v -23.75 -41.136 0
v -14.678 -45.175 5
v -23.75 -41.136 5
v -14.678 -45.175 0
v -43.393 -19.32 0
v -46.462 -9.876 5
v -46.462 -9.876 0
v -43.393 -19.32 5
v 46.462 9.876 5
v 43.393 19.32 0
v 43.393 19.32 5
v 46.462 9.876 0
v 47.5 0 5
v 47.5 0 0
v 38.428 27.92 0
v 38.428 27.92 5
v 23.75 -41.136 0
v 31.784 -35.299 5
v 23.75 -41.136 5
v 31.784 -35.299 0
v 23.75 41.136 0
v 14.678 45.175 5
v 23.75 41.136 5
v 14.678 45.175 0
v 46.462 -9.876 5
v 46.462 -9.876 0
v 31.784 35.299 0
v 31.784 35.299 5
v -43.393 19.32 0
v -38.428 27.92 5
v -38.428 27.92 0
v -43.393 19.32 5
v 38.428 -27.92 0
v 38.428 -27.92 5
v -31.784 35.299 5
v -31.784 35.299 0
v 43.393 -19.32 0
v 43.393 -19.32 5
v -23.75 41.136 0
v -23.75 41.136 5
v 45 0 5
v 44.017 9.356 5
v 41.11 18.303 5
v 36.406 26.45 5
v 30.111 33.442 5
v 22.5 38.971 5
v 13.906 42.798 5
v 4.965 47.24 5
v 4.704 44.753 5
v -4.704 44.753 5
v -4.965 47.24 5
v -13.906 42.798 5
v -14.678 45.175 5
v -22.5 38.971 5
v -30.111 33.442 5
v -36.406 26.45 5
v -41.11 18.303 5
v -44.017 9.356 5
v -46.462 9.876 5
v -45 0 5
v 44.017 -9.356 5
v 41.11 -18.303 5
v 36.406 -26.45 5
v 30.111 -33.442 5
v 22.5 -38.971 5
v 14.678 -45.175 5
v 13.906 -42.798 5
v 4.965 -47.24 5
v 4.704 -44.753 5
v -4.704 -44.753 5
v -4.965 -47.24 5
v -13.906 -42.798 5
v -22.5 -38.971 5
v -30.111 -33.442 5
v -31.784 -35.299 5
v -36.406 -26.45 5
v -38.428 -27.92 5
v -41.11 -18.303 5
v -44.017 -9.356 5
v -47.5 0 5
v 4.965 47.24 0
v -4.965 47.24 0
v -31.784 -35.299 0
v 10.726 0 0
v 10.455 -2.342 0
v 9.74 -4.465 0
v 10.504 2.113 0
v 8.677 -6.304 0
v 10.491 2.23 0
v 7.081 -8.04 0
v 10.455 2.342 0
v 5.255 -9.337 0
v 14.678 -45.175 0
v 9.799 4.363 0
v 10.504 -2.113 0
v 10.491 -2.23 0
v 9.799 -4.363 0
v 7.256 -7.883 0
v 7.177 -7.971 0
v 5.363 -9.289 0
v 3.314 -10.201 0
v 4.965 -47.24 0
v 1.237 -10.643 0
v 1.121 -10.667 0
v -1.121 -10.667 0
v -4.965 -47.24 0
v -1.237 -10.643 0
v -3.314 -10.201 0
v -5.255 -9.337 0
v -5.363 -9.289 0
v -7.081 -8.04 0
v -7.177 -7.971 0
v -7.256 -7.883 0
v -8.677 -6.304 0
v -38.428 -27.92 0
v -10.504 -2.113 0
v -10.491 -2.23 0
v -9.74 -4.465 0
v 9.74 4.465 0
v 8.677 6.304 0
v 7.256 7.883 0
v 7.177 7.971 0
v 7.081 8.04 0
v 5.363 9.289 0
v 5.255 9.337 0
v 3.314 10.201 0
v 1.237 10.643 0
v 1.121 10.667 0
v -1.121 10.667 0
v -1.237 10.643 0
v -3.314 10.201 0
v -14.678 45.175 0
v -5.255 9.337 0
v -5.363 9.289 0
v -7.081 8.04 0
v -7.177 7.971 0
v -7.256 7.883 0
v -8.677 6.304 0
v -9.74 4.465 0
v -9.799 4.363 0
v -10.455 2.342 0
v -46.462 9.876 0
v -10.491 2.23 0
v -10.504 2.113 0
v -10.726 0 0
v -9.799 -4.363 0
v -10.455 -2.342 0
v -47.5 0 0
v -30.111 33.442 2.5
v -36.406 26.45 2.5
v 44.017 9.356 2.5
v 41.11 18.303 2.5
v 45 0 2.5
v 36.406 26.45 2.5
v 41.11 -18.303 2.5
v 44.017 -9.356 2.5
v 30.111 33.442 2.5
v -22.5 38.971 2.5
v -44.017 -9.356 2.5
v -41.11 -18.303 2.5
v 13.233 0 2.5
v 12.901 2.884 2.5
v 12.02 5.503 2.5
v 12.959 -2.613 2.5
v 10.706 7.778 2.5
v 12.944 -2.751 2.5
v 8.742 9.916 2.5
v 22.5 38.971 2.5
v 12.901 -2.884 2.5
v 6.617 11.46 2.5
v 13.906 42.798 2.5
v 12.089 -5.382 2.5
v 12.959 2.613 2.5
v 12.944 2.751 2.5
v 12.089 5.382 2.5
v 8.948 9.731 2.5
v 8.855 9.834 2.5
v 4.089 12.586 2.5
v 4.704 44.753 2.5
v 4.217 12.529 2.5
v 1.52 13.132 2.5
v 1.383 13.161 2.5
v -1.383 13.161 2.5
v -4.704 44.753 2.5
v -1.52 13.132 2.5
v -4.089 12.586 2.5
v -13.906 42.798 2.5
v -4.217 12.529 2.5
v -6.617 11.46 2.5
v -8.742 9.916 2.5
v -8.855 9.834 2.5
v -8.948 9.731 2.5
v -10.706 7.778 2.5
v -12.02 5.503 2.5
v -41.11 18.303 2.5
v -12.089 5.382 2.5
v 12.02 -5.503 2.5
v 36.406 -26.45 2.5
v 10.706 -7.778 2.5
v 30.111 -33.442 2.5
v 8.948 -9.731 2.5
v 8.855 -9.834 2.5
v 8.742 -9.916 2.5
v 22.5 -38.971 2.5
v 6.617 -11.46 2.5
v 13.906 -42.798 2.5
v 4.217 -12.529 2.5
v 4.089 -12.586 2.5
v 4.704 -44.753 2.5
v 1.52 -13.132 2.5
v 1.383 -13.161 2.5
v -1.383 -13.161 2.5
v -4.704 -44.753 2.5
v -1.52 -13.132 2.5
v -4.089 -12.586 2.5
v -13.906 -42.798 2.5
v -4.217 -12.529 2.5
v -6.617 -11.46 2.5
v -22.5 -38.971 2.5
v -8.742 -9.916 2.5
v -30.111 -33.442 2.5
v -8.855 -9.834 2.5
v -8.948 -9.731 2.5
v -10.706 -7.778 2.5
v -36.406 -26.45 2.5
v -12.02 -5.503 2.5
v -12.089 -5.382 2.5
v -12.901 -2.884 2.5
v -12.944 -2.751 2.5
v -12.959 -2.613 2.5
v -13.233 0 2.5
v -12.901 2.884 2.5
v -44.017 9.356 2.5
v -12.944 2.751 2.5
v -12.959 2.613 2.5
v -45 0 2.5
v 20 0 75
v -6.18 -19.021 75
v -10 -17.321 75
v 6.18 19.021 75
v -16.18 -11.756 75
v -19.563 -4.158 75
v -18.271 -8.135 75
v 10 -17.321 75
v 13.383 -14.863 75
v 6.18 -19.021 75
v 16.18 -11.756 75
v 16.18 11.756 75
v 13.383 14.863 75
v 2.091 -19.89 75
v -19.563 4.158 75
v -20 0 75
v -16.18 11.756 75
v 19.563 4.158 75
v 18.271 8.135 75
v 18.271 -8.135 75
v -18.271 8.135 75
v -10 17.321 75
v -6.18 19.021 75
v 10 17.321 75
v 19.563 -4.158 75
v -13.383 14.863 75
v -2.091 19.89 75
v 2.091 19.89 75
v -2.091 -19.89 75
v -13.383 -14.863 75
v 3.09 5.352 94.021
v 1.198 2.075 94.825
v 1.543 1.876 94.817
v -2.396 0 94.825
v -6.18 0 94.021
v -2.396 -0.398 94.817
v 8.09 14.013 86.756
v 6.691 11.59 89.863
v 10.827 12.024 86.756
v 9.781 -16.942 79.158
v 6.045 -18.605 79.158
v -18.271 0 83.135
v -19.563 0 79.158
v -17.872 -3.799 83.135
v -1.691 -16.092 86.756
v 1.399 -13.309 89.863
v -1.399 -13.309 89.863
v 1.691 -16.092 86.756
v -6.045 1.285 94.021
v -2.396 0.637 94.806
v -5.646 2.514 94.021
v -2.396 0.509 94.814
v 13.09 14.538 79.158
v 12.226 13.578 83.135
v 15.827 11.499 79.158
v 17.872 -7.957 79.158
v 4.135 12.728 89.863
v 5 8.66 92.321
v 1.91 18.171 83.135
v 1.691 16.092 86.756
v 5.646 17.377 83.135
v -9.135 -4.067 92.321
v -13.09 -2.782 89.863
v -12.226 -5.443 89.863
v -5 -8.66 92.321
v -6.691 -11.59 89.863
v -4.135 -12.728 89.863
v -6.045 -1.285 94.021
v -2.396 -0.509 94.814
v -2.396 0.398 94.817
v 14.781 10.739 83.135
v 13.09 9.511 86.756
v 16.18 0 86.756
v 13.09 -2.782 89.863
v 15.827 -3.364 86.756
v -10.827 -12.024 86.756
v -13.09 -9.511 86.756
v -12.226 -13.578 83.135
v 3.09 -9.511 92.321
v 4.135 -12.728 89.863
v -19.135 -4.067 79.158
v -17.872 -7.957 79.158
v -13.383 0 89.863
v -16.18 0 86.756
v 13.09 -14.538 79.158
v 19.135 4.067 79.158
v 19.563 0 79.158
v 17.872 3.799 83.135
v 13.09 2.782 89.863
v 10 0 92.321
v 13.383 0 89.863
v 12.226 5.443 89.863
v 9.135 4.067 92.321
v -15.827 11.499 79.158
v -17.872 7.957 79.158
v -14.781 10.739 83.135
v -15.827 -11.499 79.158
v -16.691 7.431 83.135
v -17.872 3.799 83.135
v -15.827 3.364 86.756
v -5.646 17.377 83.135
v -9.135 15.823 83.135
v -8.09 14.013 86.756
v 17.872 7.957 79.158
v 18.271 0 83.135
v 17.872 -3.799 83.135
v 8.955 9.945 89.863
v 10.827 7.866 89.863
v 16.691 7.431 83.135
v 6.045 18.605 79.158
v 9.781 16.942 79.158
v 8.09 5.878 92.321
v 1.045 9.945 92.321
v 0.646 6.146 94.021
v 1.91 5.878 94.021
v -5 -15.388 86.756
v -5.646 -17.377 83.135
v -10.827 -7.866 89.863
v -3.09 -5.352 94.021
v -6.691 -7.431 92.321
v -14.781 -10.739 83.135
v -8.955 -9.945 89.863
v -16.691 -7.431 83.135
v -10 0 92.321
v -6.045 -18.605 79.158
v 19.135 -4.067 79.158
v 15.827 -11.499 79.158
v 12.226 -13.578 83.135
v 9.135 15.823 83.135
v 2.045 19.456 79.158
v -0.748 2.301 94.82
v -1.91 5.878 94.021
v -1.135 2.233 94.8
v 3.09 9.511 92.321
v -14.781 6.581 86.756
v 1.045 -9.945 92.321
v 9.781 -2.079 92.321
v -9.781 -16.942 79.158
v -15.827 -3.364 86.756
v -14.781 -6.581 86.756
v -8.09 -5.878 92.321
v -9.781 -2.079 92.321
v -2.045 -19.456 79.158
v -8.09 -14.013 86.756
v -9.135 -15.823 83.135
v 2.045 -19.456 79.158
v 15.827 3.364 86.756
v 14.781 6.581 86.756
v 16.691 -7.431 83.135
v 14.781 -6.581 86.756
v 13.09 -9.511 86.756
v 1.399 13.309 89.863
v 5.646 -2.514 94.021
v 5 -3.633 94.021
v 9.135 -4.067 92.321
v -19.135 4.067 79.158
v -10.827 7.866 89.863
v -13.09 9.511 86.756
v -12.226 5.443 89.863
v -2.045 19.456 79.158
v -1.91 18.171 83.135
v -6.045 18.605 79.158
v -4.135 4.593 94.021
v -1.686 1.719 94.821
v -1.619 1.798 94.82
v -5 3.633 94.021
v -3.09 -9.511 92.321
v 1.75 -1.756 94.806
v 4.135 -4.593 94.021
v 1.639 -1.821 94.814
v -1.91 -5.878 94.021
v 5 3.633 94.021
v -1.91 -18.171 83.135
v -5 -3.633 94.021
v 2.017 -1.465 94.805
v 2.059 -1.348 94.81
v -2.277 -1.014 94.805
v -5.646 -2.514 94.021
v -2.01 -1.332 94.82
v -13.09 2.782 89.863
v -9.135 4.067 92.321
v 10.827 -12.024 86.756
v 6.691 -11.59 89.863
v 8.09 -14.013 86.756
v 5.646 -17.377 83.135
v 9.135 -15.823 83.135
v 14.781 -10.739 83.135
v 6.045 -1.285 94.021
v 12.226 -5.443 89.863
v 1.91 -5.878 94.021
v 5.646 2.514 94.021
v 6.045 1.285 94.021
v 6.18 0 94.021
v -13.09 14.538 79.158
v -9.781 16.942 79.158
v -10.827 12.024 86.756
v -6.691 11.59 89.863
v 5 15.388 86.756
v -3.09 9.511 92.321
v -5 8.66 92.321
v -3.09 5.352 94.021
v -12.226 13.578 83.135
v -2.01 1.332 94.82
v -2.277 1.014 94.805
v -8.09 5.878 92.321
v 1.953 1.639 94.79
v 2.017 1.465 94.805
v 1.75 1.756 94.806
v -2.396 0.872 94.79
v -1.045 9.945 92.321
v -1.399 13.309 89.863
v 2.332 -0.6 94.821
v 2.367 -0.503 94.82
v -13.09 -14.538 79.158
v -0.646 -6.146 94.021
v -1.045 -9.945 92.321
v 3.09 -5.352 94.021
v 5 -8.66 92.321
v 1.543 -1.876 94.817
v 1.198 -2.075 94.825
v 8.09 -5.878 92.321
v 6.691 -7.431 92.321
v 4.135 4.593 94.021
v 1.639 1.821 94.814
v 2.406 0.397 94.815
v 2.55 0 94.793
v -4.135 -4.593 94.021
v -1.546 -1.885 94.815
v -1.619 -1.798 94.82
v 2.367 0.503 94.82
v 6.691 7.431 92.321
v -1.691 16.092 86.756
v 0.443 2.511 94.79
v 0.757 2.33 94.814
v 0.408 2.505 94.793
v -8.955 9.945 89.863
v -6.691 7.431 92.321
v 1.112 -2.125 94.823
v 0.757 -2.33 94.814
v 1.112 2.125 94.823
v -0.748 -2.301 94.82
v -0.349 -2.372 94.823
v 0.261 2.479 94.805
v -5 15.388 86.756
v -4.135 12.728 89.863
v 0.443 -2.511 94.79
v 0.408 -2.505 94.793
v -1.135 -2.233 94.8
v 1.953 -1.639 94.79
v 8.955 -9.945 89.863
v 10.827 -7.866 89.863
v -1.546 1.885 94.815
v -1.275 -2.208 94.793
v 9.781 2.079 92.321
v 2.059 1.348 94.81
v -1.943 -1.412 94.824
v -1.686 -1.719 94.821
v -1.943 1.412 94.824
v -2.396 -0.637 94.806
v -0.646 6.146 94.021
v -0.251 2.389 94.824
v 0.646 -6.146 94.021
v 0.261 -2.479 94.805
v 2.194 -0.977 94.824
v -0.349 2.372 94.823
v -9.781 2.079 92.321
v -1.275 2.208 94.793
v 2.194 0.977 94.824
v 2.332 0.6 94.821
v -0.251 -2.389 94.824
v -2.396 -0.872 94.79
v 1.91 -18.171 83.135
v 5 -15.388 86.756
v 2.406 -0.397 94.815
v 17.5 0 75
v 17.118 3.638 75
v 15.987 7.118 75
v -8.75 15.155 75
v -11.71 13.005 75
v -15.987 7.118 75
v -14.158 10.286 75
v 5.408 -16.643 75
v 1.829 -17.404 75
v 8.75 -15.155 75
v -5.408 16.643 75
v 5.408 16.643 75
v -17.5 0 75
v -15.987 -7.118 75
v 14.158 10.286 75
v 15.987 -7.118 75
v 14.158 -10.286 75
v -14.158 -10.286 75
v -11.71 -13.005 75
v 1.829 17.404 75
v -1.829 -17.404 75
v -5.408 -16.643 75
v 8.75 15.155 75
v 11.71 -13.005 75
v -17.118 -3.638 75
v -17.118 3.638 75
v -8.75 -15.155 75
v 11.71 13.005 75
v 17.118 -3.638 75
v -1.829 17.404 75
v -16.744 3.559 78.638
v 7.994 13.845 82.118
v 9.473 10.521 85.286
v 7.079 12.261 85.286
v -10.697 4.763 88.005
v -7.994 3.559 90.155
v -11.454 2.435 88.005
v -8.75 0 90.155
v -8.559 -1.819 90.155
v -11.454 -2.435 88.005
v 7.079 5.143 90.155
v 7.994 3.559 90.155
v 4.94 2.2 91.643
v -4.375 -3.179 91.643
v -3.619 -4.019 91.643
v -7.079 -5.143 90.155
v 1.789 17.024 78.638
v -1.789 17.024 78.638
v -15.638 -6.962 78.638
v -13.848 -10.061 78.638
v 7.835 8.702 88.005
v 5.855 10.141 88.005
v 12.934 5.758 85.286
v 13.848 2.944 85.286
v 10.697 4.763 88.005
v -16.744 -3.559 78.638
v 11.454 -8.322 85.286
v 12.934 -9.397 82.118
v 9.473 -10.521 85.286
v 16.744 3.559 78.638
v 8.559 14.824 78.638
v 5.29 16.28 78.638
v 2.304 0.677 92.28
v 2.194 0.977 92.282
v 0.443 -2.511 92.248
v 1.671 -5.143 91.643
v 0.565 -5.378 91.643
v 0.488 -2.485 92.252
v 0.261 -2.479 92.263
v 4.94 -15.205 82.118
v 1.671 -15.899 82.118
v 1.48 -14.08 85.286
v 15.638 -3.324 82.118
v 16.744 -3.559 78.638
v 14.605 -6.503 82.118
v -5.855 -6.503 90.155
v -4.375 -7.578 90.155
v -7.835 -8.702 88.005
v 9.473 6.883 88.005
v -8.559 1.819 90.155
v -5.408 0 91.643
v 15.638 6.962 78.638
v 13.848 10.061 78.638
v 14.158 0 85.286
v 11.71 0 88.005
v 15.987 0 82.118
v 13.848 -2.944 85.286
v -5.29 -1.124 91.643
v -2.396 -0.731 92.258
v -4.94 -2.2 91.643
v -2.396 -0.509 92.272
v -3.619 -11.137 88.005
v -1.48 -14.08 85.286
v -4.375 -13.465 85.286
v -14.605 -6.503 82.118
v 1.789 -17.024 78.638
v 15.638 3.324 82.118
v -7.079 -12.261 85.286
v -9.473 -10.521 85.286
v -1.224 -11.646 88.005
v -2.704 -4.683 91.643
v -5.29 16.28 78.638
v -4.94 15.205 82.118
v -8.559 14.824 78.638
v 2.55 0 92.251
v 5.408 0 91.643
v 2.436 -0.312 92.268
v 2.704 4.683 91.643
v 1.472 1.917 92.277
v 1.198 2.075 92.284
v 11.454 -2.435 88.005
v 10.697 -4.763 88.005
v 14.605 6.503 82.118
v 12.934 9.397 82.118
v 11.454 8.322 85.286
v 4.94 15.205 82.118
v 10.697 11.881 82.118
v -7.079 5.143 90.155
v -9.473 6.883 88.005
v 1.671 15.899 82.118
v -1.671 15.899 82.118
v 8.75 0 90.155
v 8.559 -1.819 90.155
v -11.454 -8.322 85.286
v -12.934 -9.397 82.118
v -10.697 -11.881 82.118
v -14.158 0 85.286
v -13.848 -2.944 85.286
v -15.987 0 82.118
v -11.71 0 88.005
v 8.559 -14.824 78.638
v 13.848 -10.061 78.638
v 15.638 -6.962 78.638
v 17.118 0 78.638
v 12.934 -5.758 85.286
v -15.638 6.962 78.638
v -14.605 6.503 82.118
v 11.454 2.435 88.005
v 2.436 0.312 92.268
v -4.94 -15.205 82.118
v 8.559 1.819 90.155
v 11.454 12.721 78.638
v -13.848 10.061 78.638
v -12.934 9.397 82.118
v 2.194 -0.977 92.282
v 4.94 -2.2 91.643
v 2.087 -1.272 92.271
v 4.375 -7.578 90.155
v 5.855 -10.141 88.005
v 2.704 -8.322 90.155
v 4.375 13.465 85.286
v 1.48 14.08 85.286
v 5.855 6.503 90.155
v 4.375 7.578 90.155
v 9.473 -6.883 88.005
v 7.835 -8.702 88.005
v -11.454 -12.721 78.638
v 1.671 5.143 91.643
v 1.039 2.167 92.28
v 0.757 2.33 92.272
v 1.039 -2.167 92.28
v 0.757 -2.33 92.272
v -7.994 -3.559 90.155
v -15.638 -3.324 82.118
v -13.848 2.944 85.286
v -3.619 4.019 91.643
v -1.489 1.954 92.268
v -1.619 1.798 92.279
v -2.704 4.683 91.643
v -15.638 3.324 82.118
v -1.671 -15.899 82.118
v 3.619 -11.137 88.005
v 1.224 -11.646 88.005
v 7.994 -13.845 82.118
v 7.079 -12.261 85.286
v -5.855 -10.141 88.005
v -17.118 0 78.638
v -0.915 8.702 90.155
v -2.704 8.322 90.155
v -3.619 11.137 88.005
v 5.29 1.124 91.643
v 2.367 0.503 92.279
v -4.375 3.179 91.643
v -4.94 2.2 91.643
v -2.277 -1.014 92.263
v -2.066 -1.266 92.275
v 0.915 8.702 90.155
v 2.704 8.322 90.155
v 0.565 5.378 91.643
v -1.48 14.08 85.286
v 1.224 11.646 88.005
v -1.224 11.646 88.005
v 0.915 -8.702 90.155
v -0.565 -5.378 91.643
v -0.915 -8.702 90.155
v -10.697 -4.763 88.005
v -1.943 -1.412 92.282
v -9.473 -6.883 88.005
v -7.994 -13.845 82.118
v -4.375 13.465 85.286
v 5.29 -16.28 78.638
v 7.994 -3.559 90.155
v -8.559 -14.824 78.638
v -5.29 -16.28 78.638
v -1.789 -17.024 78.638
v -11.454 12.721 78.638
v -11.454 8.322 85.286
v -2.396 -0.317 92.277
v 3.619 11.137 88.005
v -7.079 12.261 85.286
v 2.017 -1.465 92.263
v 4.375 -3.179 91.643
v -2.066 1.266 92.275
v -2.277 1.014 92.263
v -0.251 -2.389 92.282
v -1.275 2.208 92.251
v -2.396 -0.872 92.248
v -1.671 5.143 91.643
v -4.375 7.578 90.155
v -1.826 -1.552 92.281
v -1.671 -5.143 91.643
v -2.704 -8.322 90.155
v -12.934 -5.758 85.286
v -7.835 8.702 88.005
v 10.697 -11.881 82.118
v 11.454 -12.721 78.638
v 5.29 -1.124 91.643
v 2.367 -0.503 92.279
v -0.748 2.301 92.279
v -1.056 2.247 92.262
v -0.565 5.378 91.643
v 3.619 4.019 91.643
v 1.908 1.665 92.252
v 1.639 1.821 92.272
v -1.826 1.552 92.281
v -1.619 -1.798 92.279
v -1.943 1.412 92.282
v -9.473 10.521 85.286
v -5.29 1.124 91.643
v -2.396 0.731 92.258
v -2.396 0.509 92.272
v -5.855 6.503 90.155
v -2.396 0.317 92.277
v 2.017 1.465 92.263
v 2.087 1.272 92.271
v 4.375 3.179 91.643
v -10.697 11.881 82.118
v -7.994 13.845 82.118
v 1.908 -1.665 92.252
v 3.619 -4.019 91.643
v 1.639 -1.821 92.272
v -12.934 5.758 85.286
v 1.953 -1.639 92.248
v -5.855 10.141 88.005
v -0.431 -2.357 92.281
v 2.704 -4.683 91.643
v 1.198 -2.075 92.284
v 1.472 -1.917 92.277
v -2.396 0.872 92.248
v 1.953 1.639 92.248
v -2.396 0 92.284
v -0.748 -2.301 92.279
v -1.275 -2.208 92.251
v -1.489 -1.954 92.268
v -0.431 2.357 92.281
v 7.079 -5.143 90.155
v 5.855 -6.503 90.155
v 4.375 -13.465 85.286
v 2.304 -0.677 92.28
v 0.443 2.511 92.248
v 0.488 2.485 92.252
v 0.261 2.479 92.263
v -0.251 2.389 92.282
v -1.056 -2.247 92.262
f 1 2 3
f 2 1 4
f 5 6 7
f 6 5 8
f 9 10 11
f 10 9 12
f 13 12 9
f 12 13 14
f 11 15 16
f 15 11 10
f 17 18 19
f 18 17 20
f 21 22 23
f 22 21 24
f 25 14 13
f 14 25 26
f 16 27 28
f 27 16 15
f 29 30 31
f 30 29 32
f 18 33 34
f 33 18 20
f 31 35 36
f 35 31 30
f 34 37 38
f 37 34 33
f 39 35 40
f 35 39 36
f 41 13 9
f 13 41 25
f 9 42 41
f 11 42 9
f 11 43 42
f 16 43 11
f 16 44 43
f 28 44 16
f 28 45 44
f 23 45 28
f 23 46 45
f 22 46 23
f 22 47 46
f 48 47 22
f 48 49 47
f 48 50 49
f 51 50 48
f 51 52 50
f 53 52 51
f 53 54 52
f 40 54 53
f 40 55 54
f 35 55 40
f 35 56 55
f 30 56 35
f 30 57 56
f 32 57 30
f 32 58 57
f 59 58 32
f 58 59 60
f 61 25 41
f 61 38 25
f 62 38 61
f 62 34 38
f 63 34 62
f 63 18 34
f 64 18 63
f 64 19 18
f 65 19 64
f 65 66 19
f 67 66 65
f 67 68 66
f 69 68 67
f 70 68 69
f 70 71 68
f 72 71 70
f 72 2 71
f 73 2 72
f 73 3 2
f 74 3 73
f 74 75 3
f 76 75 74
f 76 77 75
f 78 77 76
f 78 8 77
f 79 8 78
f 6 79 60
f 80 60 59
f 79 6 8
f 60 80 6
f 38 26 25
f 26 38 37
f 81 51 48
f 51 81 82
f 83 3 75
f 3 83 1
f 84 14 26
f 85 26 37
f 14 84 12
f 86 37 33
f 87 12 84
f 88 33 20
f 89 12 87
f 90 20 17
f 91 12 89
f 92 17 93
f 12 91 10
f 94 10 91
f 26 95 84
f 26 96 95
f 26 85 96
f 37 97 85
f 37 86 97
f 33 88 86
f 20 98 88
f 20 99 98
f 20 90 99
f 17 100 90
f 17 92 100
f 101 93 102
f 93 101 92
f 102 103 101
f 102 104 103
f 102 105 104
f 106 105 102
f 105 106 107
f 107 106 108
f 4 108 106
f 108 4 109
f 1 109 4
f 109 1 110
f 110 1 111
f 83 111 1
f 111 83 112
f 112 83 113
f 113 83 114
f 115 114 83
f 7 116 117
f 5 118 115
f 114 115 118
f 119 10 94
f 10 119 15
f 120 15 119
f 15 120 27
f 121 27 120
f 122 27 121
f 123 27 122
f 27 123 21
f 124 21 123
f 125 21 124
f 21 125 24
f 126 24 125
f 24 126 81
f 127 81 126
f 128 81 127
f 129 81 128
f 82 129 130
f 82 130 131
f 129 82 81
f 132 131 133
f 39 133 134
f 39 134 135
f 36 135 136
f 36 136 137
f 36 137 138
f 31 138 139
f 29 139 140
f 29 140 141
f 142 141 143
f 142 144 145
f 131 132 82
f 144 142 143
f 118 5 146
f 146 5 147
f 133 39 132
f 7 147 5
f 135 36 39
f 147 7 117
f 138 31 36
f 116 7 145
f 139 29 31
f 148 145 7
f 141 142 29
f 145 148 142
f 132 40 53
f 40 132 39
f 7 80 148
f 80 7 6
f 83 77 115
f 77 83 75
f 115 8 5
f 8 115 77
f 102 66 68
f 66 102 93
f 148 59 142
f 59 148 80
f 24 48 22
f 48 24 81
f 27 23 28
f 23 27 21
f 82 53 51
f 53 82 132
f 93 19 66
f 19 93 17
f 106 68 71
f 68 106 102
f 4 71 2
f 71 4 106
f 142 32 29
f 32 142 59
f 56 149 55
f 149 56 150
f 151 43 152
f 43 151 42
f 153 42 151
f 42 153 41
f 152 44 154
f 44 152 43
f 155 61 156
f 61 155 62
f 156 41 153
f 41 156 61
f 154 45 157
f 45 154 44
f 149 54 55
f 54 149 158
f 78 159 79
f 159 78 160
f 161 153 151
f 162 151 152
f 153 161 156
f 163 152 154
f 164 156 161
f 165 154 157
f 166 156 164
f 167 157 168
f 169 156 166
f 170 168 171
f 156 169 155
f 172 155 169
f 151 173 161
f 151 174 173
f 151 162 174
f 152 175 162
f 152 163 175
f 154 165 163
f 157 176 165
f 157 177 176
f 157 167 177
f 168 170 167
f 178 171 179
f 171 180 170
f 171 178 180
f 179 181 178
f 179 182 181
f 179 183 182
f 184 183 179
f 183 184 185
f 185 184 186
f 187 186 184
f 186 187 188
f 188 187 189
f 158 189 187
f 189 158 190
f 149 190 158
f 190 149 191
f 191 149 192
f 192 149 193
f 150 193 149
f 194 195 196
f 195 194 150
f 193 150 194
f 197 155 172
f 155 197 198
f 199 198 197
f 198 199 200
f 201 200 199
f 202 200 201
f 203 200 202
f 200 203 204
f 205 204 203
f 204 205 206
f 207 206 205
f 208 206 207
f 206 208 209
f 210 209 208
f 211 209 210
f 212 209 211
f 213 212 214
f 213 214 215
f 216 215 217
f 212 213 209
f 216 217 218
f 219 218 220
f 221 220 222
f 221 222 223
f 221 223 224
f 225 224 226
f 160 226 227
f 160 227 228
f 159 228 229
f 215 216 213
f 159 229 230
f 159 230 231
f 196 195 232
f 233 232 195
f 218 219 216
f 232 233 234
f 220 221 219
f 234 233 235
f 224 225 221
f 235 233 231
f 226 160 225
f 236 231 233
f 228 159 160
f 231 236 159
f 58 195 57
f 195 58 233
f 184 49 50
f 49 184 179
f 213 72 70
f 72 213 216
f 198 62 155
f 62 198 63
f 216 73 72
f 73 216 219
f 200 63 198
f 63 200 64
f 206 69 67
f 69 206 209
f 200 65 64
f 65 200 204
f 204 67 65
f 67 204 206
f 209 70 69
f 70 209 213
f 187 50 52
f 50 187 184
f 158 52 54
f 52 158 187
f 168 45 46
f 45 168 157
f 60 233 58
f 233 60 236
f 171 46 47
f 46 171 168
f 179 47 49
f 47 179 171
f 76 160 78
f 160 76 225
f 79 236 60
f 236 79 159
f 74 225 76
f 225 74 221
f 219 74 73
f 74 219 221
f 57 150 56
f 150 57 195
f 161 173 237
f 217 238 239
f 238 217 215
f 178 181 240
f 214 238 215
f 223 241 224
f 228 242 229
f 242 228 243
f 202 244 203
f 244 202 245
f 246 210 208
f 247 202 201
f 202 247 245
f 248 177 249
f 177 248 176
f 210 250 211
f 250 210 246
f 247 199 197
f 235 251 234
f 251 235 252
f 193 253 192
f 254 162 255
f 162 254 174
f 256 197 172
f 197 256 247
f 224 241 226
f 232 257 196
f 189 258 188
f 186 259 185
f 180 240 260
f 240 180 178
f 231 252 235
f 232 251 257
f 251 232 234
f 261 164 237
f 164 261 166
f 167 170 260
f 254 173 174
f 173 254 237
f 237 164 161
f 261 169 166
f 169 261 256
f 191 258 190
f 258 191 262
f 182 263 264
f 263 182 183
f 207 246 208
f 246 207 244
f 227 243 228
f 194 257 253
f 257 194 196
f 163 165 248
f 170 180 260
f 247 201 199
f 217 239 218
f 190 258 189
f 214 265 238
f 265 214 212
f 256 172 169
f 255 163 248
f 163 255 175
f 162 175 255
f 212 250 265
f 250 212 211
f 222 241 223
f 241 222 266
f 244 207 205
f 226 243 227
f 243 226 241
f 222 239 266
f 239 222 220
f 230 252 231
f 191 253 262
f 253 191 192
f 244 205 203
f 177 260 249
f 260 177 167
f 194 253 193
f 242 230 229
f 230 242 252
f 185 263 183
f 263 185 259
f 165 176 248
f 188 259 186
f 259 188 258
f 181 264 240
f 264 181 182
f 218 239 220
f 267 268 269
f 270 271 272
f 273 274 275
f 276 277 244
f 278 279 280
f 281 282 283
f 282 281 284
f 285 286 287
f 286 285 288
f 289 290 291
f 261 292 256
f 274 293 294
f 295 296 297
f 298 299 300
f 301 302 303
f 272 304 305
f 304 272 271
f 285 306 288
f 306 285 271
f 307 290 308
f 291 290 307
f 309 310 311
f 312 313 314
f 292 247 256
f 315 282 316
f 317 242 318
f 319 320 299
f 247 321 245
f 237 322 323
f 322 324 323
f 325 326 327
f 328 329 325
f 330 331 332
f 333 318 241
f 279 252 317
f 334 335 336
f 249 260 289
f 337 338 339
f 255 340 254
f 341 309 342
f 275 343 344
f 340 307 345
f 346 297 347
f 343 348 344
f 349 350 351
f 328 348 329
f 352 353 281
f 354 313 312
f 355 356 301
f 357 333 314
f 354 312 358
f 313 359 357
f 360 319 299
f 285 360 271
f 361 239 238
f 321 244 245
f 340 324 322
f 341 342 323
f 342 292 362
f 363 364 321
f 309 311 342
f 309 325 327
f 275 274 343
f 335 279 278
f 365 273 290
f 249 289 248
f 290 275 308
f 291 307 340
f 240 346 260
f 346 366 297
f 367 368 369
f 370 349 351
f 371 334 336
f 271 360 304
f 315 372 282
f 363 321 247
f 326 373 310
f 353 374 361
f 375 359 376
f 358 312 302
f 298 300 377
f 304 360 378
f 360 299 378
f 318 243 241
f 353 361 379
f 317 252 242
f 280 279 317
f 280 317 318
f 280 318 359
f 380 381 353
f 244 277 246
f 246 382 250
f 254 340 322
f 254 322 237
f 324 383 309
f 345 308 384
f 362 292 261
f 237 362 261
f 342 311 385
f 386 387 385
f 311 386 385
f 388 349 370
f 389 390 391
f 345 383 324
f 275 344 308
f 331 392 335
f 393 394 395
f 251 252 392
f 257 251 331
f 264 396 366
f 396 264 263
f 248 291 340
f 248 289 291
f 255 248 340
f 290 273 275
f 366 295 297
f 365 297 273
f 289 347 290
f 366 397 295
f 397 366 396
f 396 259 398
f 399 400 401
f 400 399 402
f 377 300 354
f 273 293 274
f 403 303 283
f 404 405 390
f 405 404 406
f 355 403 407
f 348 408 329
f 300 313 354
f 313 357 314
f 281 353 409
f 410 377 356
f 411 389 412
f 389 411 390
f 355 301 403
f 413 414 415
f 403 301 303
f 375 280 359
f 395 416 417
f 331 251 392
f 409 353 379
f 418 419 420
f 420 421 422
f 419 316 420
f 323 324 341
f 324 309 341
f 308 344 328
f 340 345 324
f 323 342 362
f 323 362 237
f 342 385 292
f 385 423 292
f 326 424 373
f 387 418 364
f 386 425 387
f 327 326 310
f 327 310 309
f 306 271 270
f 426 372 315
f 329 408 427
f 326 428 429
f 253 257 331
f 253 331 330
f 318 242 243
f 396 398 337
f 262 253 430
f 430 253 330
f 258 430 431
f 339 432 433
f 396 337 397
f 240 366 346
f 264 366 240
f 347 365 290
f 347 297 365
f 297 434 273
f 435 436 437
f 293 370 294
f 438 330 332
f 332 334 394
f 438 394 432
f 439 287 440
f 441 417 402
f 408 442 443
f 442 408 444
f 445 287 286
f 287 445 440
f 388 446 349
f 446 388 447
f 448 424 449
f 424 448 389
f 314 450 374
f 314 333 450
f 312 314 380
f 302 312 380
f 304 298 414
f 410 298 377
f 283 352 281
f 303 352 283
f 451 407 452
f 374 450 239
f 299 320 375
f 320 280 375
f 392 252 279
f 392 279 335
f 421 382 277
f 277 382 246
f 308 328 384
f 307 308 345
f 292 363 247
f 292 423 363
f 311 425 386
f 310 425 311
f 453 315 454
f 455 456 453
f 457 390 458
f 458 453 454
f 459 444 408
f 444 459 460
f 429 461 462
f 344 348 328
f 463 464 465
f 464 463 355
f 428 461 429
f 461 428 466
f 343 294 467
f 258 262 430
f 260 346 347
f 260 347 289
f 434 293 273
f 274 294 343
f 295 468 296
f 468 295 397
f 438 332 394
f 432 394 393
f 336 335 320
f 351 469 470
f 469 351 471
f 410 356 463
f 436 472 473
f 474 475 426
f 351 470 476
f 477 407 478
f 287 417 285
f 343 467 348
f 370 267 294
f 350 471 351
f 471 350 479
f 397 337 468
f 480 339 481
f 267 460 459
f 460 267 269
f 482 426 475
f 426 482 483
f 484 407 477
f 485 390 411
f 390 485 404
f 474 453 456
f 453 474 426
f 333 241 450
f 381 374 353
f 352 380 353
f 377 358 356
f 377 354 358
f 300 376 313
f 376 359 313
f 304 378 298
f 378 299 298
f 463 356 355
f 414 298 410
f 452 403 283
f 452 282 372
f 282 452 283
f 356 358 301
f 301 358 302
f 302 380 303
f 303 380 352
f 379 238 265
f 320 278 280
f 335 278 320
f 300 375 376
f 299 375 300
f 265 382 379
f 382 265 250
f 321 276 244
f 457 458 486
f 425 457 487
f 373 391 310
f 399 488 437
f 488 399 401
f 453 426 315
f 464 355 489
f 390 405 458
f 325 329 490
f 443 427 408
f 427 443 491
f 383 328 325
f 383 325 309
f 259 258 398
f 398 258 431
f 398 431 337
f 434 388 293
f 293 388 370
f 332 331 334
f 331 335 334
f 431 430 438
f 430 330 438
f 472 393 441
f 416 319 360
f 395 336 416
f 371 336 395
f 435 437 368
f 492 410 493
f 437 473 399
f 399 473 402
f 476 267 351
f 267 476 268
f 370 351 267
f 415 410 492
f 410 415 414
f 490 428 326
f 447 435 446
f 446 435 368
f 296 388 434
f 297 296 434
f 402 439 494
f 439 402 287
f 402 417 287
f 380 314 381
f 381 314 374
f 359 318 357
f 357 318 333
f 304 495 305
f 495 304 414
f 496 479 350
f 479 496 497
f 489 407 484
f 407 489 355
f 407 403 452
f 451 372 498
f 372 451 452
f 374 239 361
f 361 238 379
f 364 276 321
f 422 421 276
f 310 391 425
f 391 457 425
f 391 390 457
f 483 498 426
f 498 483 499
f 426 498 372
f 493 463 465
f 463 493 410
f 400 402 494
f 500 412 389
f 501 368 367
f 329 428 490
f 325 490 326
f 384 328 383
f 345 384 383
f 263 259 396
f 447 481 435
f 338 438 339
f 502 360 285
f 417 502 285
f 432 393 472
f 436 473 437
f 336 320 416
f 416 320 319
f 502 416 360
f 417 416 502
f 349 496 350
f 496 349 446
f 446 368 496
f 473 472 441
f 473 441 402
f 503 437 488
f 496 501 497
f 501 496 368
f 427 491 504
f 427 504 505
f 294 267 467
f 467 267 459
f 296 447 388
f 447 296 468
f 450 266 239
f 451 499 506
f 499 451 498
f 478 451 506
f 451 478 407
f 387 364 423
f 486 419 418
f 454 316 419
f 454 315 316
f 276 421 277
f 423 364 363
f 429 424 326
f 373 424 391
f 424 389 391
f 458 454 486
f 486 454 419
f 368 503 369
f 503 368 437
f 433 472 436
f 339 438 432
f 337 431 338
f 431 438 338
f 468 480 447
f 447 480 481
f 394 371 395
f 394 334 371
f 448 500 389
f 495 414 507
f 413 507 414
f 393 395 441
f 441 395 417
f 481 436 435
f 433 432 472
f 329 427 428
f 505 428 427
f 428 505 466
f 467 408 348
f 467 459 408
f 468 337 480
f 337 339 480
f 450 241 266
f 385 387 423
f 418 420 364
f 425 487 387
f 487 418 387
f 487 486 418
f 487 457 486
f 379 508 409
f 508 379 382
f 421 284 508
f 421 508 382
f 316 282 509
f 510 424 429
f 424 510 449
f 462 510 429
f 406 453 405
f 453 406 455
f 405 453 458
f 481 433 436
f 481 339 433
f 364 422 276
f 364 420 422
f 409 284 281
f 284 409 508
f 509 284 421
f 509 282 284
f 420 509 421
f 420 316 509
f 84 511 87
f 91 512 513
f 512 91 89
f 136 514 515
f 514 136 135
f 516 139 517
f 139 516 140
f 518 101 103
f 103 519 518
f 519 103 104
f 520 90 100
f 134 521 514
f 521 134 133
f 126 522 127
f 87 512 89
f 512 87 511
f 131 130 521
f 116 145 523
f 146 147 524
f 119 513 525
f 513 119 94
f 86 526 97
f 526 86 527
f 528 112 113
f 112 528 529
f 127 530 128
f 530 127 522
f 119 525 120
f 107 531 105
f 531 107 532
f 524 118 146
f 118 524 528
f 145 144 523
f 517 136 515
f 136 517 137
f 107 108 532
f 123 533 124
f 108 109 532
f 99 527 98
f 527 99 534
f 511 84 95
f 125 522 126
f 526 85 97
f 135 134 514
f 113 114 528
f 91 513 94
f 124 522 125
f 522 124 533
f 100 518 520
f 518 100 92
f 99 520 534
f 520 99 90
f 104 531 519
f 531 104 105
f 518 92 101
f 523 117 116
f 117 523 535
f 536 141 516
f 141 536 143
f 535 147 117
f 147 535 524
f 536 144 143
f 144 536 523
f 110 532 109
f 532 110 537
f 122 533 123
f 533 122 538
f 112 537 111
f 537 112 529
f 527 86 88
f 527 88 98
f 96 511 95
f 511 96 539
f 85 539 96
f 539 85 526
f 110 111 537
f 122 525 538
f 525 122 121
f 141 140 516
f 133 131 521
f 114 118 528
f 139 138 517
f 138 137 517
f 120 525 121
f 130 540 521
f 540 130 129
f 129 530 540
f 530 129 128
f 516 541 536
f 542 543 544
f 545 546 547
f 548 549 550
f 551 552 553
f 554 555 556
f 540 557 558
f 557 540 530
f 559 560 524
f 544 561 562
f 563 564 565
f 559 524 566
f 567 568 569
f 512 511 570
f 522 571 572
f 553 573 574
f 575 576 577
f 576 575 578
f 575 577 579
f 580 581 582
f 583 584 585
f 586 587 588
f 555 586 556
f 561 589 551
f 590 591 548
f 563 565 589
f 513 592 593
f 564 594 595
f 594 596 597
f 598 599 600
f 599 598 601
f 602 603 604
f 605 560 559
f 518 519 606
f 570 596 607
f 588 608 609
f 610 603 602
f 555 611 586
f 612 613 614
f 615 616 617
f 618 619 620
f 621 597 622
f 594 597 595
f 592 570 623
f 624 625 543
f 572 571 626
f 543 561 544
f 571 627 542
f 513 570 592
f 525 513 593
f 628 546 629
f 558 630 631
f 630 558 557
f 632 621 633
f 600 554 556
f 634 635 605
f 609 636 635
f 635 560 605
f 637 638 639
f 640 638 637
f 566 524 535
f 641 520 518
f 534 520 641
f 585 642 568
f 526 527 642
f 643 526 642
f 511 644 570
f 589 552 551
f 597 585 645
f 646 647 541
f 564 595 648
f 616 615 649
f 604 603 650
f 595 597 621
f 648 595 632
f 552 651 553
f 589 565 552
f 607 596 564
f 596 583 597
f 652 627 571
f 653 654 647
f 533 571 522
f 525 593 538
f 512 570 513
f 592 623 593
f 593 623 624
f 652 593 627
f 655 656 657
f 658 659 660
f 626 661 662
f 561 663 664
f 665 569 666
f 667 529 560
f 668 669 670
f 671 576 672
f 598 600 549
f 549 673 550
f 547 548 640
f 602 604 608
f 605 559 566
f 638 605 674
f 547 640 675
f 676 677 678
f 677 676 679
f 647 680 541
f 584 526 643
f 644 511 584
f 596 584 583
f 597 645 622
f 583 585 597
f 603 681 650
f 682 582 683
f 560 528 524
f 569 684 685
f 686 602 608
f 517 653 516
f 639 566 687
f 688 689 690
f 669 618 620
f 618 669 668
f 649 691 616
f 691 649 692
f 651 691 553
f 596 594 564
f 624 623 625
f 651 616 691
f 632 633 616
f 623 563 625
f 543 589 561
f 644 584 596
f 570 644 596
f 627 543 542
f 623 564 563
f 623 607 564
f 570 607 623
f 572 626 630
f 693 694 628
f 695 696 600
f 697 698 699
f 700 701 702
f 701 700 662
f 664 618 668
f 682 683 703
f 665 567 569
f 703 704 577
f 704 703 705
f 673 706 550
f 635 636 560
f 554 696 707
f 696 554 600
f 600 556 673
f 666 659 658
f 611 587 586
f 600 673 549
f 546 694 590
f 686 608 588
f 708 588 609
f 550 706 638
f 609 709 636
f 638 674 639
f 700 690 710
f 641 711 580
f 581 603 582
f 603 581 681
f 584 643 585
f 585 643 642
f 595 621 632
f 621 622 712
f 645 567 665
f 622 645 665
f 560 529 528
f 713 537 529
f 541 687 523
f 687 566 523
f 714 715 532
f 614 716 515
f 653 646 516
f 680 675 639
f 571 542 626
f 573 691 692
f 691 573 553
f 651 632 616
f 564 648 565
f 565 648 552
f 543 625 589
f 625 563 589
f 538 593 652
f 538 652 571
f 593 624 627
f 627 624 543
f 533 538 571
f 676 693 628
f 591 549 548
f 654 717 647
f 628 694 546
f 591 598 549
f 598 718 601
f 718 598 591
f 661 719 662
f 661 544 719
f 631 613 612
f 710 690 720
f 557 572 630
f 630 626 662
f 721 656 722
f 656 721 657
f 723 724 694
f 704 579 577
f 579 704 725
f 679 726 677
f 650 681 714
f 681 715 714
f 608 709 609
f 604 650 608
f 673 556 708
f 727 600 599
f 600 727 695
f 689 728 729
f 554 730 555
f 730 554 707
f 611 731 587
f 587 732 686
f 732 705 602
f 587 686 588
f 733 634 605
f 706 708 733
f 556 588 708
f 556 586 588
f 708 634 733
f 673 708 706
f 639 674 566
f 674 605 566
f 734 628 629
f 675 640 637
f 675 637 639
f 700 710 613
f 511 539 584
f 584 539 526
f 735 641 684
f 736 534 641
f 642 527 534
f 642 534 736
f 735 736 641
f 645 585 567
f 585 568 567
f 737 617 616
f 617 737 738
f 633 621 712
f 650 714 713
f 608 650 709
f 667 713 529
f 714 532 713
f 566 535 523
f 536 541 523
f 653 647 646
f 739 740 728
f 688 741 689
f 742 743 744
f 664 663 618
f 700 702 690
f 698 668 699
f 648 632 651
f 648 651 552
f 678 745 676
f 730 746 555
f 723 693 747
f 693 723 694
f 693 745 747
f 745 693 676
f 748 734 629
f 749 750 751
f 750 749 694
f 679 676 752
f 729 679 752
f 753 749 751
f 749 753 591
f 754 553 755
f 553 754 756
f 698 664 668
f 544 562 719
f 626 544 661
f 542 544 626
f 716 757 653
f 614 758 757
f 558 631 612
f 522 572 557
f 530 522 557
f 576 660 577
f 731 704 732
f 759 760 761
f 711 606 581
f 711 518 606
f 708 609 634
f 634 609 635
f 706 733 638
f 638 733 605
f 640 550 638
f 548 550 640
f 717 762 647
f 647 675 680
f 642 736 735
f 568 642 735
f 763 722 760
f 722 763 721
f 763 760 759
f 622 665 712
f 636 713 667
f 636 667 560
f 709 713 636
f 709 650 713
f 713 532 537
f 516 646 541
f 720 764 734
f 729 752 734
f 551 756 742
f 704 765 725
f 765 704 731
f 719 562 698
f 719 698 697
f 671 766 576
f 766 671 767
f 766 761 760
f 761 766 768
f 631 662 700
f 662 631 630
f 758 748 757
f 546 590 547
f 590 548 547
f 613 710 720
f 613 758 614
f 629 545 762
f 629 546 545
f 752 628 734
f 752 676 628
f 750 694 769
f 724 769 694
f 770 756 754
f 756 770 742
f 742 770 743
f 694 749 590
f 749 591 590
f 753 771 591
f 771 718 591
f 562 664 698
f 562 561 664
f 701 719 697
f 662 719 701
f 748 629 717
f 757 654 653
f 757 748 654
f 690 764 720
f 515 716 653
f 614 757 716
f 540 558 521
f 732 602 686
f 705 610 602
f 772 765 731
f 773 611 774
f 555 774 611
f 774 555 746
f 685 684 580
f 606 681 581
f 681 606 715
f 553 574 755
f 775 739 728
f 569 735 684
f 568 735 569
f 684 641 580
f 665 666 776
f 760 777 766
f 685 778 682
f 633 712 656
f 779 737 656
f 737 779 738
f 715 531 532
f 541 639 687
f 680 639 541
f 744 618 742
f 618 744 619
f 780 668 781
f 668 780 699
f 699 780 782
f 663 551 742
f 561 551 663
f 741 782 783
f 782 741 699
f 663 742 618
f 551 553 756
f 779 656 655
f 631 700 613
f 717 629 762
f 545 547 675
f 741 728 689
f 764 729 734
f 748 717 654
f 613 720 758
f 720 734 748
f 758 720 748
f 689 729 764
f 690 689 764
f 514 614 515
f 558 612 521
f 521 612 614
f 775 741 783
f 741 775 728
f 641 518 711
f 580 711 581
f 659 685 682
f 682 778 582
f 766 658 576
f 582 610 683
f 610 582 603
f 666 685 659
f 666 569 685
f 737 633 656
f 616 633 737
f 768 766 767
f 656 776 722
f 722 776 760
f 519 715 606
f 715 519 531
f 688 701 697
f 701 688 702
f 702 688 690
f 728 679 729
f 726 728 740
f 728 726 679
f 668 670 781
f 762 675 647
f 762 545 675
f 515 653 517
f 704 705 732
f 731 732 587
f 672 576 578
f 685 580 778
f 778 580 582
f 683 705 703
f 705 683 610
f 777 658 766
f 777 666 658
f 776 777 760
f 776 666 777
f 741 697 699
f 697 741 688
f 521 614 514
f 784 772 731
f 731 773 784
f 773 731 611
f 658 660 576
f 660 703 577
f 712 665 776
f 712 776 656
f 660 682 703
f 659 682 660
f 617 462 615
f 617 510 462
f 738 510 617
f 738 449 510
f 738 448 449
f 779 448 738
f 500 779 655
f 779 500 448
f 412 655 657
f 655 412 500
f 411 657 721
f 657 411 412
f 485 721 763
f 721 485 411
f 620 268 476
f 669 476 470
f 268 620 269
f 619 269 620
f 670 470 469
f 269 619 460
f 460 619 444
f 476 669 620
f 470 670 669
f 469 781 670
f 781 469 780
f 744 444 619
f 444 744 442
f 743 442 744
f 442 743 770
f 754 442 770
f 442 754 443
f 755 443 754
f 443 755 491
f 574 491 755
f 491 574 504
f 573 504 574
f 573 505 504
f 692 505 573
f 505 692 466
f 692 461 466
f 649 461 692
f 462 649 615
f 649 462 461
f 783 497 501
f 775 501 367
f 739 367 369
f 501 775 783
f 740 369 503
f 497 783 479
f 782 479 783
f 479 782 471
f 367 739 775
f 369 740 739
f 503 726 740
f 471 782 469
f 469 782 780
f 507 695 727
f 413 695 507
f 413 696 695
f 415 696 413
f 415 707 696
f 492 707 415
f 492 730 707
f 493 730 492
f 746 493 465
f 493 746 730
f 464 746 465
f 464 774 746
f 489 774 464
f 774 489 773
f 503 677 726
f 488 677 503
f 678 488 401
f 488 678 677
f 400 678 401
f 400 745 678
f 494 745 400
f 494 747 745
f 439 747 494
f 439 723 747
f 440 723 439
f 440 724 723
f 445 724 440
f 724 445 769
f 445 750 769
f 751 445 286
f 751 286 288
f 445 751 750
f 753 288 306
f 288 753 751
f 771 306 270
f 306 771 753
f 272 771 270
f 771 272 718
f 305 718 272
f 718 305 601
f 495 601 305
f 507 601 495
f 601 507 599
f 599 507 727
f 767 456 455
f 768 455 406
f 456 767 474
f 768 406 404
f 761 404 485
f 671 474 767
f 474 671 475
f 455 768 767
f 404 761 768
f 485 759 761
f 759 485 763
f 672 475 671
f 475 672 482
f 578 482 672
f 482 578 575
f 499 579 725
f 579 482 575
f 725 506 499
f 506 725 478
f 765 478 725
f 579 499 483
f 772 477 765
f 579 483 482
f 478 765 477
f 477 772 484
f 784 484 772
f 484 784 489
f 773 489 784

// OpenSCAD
//Quantum Hockey pusher
//by Anghelos

handleRadius = 40 / 2;
handleHeight = 95;
baseRadius = 95 /2;
wallThickness = 2.5;
ledRadius = 5.1 / 2;
handleTaper = 7;


difference(){
    union(){
        //base
        difference(){
            cylinder(h = wallThickness * 2, r = baseRadius);
            translate([0,0,wallThickness]) cylinder(h = wallThickness * 2, r = baseRadius - wallThickness);
        }
        //handle
        cylinder(h = handleHeight - handleRadius, r1 = handleRadius - handleTaper, r2 = handleRadius);
        translate([0,0,handleHeight - handleRadius]) sphere(handleRadius);
    }
    union(){
        //holes
        translate([0,0,-wallThickness]) cylinder(h = handleHeight - handleRadius + wallThickness, r1 = handleRadius - wallThickness - handleTaper, r2 = handleRadius - wallThickness);
        translate([0,0,handleHeight - handleRadius]) sphere(handleRadius - wallThickness);
        translate([0,0,handleHeight]) cylinder(h = wallThickness * 3, r = ledRadius, center = true);
    }
}
